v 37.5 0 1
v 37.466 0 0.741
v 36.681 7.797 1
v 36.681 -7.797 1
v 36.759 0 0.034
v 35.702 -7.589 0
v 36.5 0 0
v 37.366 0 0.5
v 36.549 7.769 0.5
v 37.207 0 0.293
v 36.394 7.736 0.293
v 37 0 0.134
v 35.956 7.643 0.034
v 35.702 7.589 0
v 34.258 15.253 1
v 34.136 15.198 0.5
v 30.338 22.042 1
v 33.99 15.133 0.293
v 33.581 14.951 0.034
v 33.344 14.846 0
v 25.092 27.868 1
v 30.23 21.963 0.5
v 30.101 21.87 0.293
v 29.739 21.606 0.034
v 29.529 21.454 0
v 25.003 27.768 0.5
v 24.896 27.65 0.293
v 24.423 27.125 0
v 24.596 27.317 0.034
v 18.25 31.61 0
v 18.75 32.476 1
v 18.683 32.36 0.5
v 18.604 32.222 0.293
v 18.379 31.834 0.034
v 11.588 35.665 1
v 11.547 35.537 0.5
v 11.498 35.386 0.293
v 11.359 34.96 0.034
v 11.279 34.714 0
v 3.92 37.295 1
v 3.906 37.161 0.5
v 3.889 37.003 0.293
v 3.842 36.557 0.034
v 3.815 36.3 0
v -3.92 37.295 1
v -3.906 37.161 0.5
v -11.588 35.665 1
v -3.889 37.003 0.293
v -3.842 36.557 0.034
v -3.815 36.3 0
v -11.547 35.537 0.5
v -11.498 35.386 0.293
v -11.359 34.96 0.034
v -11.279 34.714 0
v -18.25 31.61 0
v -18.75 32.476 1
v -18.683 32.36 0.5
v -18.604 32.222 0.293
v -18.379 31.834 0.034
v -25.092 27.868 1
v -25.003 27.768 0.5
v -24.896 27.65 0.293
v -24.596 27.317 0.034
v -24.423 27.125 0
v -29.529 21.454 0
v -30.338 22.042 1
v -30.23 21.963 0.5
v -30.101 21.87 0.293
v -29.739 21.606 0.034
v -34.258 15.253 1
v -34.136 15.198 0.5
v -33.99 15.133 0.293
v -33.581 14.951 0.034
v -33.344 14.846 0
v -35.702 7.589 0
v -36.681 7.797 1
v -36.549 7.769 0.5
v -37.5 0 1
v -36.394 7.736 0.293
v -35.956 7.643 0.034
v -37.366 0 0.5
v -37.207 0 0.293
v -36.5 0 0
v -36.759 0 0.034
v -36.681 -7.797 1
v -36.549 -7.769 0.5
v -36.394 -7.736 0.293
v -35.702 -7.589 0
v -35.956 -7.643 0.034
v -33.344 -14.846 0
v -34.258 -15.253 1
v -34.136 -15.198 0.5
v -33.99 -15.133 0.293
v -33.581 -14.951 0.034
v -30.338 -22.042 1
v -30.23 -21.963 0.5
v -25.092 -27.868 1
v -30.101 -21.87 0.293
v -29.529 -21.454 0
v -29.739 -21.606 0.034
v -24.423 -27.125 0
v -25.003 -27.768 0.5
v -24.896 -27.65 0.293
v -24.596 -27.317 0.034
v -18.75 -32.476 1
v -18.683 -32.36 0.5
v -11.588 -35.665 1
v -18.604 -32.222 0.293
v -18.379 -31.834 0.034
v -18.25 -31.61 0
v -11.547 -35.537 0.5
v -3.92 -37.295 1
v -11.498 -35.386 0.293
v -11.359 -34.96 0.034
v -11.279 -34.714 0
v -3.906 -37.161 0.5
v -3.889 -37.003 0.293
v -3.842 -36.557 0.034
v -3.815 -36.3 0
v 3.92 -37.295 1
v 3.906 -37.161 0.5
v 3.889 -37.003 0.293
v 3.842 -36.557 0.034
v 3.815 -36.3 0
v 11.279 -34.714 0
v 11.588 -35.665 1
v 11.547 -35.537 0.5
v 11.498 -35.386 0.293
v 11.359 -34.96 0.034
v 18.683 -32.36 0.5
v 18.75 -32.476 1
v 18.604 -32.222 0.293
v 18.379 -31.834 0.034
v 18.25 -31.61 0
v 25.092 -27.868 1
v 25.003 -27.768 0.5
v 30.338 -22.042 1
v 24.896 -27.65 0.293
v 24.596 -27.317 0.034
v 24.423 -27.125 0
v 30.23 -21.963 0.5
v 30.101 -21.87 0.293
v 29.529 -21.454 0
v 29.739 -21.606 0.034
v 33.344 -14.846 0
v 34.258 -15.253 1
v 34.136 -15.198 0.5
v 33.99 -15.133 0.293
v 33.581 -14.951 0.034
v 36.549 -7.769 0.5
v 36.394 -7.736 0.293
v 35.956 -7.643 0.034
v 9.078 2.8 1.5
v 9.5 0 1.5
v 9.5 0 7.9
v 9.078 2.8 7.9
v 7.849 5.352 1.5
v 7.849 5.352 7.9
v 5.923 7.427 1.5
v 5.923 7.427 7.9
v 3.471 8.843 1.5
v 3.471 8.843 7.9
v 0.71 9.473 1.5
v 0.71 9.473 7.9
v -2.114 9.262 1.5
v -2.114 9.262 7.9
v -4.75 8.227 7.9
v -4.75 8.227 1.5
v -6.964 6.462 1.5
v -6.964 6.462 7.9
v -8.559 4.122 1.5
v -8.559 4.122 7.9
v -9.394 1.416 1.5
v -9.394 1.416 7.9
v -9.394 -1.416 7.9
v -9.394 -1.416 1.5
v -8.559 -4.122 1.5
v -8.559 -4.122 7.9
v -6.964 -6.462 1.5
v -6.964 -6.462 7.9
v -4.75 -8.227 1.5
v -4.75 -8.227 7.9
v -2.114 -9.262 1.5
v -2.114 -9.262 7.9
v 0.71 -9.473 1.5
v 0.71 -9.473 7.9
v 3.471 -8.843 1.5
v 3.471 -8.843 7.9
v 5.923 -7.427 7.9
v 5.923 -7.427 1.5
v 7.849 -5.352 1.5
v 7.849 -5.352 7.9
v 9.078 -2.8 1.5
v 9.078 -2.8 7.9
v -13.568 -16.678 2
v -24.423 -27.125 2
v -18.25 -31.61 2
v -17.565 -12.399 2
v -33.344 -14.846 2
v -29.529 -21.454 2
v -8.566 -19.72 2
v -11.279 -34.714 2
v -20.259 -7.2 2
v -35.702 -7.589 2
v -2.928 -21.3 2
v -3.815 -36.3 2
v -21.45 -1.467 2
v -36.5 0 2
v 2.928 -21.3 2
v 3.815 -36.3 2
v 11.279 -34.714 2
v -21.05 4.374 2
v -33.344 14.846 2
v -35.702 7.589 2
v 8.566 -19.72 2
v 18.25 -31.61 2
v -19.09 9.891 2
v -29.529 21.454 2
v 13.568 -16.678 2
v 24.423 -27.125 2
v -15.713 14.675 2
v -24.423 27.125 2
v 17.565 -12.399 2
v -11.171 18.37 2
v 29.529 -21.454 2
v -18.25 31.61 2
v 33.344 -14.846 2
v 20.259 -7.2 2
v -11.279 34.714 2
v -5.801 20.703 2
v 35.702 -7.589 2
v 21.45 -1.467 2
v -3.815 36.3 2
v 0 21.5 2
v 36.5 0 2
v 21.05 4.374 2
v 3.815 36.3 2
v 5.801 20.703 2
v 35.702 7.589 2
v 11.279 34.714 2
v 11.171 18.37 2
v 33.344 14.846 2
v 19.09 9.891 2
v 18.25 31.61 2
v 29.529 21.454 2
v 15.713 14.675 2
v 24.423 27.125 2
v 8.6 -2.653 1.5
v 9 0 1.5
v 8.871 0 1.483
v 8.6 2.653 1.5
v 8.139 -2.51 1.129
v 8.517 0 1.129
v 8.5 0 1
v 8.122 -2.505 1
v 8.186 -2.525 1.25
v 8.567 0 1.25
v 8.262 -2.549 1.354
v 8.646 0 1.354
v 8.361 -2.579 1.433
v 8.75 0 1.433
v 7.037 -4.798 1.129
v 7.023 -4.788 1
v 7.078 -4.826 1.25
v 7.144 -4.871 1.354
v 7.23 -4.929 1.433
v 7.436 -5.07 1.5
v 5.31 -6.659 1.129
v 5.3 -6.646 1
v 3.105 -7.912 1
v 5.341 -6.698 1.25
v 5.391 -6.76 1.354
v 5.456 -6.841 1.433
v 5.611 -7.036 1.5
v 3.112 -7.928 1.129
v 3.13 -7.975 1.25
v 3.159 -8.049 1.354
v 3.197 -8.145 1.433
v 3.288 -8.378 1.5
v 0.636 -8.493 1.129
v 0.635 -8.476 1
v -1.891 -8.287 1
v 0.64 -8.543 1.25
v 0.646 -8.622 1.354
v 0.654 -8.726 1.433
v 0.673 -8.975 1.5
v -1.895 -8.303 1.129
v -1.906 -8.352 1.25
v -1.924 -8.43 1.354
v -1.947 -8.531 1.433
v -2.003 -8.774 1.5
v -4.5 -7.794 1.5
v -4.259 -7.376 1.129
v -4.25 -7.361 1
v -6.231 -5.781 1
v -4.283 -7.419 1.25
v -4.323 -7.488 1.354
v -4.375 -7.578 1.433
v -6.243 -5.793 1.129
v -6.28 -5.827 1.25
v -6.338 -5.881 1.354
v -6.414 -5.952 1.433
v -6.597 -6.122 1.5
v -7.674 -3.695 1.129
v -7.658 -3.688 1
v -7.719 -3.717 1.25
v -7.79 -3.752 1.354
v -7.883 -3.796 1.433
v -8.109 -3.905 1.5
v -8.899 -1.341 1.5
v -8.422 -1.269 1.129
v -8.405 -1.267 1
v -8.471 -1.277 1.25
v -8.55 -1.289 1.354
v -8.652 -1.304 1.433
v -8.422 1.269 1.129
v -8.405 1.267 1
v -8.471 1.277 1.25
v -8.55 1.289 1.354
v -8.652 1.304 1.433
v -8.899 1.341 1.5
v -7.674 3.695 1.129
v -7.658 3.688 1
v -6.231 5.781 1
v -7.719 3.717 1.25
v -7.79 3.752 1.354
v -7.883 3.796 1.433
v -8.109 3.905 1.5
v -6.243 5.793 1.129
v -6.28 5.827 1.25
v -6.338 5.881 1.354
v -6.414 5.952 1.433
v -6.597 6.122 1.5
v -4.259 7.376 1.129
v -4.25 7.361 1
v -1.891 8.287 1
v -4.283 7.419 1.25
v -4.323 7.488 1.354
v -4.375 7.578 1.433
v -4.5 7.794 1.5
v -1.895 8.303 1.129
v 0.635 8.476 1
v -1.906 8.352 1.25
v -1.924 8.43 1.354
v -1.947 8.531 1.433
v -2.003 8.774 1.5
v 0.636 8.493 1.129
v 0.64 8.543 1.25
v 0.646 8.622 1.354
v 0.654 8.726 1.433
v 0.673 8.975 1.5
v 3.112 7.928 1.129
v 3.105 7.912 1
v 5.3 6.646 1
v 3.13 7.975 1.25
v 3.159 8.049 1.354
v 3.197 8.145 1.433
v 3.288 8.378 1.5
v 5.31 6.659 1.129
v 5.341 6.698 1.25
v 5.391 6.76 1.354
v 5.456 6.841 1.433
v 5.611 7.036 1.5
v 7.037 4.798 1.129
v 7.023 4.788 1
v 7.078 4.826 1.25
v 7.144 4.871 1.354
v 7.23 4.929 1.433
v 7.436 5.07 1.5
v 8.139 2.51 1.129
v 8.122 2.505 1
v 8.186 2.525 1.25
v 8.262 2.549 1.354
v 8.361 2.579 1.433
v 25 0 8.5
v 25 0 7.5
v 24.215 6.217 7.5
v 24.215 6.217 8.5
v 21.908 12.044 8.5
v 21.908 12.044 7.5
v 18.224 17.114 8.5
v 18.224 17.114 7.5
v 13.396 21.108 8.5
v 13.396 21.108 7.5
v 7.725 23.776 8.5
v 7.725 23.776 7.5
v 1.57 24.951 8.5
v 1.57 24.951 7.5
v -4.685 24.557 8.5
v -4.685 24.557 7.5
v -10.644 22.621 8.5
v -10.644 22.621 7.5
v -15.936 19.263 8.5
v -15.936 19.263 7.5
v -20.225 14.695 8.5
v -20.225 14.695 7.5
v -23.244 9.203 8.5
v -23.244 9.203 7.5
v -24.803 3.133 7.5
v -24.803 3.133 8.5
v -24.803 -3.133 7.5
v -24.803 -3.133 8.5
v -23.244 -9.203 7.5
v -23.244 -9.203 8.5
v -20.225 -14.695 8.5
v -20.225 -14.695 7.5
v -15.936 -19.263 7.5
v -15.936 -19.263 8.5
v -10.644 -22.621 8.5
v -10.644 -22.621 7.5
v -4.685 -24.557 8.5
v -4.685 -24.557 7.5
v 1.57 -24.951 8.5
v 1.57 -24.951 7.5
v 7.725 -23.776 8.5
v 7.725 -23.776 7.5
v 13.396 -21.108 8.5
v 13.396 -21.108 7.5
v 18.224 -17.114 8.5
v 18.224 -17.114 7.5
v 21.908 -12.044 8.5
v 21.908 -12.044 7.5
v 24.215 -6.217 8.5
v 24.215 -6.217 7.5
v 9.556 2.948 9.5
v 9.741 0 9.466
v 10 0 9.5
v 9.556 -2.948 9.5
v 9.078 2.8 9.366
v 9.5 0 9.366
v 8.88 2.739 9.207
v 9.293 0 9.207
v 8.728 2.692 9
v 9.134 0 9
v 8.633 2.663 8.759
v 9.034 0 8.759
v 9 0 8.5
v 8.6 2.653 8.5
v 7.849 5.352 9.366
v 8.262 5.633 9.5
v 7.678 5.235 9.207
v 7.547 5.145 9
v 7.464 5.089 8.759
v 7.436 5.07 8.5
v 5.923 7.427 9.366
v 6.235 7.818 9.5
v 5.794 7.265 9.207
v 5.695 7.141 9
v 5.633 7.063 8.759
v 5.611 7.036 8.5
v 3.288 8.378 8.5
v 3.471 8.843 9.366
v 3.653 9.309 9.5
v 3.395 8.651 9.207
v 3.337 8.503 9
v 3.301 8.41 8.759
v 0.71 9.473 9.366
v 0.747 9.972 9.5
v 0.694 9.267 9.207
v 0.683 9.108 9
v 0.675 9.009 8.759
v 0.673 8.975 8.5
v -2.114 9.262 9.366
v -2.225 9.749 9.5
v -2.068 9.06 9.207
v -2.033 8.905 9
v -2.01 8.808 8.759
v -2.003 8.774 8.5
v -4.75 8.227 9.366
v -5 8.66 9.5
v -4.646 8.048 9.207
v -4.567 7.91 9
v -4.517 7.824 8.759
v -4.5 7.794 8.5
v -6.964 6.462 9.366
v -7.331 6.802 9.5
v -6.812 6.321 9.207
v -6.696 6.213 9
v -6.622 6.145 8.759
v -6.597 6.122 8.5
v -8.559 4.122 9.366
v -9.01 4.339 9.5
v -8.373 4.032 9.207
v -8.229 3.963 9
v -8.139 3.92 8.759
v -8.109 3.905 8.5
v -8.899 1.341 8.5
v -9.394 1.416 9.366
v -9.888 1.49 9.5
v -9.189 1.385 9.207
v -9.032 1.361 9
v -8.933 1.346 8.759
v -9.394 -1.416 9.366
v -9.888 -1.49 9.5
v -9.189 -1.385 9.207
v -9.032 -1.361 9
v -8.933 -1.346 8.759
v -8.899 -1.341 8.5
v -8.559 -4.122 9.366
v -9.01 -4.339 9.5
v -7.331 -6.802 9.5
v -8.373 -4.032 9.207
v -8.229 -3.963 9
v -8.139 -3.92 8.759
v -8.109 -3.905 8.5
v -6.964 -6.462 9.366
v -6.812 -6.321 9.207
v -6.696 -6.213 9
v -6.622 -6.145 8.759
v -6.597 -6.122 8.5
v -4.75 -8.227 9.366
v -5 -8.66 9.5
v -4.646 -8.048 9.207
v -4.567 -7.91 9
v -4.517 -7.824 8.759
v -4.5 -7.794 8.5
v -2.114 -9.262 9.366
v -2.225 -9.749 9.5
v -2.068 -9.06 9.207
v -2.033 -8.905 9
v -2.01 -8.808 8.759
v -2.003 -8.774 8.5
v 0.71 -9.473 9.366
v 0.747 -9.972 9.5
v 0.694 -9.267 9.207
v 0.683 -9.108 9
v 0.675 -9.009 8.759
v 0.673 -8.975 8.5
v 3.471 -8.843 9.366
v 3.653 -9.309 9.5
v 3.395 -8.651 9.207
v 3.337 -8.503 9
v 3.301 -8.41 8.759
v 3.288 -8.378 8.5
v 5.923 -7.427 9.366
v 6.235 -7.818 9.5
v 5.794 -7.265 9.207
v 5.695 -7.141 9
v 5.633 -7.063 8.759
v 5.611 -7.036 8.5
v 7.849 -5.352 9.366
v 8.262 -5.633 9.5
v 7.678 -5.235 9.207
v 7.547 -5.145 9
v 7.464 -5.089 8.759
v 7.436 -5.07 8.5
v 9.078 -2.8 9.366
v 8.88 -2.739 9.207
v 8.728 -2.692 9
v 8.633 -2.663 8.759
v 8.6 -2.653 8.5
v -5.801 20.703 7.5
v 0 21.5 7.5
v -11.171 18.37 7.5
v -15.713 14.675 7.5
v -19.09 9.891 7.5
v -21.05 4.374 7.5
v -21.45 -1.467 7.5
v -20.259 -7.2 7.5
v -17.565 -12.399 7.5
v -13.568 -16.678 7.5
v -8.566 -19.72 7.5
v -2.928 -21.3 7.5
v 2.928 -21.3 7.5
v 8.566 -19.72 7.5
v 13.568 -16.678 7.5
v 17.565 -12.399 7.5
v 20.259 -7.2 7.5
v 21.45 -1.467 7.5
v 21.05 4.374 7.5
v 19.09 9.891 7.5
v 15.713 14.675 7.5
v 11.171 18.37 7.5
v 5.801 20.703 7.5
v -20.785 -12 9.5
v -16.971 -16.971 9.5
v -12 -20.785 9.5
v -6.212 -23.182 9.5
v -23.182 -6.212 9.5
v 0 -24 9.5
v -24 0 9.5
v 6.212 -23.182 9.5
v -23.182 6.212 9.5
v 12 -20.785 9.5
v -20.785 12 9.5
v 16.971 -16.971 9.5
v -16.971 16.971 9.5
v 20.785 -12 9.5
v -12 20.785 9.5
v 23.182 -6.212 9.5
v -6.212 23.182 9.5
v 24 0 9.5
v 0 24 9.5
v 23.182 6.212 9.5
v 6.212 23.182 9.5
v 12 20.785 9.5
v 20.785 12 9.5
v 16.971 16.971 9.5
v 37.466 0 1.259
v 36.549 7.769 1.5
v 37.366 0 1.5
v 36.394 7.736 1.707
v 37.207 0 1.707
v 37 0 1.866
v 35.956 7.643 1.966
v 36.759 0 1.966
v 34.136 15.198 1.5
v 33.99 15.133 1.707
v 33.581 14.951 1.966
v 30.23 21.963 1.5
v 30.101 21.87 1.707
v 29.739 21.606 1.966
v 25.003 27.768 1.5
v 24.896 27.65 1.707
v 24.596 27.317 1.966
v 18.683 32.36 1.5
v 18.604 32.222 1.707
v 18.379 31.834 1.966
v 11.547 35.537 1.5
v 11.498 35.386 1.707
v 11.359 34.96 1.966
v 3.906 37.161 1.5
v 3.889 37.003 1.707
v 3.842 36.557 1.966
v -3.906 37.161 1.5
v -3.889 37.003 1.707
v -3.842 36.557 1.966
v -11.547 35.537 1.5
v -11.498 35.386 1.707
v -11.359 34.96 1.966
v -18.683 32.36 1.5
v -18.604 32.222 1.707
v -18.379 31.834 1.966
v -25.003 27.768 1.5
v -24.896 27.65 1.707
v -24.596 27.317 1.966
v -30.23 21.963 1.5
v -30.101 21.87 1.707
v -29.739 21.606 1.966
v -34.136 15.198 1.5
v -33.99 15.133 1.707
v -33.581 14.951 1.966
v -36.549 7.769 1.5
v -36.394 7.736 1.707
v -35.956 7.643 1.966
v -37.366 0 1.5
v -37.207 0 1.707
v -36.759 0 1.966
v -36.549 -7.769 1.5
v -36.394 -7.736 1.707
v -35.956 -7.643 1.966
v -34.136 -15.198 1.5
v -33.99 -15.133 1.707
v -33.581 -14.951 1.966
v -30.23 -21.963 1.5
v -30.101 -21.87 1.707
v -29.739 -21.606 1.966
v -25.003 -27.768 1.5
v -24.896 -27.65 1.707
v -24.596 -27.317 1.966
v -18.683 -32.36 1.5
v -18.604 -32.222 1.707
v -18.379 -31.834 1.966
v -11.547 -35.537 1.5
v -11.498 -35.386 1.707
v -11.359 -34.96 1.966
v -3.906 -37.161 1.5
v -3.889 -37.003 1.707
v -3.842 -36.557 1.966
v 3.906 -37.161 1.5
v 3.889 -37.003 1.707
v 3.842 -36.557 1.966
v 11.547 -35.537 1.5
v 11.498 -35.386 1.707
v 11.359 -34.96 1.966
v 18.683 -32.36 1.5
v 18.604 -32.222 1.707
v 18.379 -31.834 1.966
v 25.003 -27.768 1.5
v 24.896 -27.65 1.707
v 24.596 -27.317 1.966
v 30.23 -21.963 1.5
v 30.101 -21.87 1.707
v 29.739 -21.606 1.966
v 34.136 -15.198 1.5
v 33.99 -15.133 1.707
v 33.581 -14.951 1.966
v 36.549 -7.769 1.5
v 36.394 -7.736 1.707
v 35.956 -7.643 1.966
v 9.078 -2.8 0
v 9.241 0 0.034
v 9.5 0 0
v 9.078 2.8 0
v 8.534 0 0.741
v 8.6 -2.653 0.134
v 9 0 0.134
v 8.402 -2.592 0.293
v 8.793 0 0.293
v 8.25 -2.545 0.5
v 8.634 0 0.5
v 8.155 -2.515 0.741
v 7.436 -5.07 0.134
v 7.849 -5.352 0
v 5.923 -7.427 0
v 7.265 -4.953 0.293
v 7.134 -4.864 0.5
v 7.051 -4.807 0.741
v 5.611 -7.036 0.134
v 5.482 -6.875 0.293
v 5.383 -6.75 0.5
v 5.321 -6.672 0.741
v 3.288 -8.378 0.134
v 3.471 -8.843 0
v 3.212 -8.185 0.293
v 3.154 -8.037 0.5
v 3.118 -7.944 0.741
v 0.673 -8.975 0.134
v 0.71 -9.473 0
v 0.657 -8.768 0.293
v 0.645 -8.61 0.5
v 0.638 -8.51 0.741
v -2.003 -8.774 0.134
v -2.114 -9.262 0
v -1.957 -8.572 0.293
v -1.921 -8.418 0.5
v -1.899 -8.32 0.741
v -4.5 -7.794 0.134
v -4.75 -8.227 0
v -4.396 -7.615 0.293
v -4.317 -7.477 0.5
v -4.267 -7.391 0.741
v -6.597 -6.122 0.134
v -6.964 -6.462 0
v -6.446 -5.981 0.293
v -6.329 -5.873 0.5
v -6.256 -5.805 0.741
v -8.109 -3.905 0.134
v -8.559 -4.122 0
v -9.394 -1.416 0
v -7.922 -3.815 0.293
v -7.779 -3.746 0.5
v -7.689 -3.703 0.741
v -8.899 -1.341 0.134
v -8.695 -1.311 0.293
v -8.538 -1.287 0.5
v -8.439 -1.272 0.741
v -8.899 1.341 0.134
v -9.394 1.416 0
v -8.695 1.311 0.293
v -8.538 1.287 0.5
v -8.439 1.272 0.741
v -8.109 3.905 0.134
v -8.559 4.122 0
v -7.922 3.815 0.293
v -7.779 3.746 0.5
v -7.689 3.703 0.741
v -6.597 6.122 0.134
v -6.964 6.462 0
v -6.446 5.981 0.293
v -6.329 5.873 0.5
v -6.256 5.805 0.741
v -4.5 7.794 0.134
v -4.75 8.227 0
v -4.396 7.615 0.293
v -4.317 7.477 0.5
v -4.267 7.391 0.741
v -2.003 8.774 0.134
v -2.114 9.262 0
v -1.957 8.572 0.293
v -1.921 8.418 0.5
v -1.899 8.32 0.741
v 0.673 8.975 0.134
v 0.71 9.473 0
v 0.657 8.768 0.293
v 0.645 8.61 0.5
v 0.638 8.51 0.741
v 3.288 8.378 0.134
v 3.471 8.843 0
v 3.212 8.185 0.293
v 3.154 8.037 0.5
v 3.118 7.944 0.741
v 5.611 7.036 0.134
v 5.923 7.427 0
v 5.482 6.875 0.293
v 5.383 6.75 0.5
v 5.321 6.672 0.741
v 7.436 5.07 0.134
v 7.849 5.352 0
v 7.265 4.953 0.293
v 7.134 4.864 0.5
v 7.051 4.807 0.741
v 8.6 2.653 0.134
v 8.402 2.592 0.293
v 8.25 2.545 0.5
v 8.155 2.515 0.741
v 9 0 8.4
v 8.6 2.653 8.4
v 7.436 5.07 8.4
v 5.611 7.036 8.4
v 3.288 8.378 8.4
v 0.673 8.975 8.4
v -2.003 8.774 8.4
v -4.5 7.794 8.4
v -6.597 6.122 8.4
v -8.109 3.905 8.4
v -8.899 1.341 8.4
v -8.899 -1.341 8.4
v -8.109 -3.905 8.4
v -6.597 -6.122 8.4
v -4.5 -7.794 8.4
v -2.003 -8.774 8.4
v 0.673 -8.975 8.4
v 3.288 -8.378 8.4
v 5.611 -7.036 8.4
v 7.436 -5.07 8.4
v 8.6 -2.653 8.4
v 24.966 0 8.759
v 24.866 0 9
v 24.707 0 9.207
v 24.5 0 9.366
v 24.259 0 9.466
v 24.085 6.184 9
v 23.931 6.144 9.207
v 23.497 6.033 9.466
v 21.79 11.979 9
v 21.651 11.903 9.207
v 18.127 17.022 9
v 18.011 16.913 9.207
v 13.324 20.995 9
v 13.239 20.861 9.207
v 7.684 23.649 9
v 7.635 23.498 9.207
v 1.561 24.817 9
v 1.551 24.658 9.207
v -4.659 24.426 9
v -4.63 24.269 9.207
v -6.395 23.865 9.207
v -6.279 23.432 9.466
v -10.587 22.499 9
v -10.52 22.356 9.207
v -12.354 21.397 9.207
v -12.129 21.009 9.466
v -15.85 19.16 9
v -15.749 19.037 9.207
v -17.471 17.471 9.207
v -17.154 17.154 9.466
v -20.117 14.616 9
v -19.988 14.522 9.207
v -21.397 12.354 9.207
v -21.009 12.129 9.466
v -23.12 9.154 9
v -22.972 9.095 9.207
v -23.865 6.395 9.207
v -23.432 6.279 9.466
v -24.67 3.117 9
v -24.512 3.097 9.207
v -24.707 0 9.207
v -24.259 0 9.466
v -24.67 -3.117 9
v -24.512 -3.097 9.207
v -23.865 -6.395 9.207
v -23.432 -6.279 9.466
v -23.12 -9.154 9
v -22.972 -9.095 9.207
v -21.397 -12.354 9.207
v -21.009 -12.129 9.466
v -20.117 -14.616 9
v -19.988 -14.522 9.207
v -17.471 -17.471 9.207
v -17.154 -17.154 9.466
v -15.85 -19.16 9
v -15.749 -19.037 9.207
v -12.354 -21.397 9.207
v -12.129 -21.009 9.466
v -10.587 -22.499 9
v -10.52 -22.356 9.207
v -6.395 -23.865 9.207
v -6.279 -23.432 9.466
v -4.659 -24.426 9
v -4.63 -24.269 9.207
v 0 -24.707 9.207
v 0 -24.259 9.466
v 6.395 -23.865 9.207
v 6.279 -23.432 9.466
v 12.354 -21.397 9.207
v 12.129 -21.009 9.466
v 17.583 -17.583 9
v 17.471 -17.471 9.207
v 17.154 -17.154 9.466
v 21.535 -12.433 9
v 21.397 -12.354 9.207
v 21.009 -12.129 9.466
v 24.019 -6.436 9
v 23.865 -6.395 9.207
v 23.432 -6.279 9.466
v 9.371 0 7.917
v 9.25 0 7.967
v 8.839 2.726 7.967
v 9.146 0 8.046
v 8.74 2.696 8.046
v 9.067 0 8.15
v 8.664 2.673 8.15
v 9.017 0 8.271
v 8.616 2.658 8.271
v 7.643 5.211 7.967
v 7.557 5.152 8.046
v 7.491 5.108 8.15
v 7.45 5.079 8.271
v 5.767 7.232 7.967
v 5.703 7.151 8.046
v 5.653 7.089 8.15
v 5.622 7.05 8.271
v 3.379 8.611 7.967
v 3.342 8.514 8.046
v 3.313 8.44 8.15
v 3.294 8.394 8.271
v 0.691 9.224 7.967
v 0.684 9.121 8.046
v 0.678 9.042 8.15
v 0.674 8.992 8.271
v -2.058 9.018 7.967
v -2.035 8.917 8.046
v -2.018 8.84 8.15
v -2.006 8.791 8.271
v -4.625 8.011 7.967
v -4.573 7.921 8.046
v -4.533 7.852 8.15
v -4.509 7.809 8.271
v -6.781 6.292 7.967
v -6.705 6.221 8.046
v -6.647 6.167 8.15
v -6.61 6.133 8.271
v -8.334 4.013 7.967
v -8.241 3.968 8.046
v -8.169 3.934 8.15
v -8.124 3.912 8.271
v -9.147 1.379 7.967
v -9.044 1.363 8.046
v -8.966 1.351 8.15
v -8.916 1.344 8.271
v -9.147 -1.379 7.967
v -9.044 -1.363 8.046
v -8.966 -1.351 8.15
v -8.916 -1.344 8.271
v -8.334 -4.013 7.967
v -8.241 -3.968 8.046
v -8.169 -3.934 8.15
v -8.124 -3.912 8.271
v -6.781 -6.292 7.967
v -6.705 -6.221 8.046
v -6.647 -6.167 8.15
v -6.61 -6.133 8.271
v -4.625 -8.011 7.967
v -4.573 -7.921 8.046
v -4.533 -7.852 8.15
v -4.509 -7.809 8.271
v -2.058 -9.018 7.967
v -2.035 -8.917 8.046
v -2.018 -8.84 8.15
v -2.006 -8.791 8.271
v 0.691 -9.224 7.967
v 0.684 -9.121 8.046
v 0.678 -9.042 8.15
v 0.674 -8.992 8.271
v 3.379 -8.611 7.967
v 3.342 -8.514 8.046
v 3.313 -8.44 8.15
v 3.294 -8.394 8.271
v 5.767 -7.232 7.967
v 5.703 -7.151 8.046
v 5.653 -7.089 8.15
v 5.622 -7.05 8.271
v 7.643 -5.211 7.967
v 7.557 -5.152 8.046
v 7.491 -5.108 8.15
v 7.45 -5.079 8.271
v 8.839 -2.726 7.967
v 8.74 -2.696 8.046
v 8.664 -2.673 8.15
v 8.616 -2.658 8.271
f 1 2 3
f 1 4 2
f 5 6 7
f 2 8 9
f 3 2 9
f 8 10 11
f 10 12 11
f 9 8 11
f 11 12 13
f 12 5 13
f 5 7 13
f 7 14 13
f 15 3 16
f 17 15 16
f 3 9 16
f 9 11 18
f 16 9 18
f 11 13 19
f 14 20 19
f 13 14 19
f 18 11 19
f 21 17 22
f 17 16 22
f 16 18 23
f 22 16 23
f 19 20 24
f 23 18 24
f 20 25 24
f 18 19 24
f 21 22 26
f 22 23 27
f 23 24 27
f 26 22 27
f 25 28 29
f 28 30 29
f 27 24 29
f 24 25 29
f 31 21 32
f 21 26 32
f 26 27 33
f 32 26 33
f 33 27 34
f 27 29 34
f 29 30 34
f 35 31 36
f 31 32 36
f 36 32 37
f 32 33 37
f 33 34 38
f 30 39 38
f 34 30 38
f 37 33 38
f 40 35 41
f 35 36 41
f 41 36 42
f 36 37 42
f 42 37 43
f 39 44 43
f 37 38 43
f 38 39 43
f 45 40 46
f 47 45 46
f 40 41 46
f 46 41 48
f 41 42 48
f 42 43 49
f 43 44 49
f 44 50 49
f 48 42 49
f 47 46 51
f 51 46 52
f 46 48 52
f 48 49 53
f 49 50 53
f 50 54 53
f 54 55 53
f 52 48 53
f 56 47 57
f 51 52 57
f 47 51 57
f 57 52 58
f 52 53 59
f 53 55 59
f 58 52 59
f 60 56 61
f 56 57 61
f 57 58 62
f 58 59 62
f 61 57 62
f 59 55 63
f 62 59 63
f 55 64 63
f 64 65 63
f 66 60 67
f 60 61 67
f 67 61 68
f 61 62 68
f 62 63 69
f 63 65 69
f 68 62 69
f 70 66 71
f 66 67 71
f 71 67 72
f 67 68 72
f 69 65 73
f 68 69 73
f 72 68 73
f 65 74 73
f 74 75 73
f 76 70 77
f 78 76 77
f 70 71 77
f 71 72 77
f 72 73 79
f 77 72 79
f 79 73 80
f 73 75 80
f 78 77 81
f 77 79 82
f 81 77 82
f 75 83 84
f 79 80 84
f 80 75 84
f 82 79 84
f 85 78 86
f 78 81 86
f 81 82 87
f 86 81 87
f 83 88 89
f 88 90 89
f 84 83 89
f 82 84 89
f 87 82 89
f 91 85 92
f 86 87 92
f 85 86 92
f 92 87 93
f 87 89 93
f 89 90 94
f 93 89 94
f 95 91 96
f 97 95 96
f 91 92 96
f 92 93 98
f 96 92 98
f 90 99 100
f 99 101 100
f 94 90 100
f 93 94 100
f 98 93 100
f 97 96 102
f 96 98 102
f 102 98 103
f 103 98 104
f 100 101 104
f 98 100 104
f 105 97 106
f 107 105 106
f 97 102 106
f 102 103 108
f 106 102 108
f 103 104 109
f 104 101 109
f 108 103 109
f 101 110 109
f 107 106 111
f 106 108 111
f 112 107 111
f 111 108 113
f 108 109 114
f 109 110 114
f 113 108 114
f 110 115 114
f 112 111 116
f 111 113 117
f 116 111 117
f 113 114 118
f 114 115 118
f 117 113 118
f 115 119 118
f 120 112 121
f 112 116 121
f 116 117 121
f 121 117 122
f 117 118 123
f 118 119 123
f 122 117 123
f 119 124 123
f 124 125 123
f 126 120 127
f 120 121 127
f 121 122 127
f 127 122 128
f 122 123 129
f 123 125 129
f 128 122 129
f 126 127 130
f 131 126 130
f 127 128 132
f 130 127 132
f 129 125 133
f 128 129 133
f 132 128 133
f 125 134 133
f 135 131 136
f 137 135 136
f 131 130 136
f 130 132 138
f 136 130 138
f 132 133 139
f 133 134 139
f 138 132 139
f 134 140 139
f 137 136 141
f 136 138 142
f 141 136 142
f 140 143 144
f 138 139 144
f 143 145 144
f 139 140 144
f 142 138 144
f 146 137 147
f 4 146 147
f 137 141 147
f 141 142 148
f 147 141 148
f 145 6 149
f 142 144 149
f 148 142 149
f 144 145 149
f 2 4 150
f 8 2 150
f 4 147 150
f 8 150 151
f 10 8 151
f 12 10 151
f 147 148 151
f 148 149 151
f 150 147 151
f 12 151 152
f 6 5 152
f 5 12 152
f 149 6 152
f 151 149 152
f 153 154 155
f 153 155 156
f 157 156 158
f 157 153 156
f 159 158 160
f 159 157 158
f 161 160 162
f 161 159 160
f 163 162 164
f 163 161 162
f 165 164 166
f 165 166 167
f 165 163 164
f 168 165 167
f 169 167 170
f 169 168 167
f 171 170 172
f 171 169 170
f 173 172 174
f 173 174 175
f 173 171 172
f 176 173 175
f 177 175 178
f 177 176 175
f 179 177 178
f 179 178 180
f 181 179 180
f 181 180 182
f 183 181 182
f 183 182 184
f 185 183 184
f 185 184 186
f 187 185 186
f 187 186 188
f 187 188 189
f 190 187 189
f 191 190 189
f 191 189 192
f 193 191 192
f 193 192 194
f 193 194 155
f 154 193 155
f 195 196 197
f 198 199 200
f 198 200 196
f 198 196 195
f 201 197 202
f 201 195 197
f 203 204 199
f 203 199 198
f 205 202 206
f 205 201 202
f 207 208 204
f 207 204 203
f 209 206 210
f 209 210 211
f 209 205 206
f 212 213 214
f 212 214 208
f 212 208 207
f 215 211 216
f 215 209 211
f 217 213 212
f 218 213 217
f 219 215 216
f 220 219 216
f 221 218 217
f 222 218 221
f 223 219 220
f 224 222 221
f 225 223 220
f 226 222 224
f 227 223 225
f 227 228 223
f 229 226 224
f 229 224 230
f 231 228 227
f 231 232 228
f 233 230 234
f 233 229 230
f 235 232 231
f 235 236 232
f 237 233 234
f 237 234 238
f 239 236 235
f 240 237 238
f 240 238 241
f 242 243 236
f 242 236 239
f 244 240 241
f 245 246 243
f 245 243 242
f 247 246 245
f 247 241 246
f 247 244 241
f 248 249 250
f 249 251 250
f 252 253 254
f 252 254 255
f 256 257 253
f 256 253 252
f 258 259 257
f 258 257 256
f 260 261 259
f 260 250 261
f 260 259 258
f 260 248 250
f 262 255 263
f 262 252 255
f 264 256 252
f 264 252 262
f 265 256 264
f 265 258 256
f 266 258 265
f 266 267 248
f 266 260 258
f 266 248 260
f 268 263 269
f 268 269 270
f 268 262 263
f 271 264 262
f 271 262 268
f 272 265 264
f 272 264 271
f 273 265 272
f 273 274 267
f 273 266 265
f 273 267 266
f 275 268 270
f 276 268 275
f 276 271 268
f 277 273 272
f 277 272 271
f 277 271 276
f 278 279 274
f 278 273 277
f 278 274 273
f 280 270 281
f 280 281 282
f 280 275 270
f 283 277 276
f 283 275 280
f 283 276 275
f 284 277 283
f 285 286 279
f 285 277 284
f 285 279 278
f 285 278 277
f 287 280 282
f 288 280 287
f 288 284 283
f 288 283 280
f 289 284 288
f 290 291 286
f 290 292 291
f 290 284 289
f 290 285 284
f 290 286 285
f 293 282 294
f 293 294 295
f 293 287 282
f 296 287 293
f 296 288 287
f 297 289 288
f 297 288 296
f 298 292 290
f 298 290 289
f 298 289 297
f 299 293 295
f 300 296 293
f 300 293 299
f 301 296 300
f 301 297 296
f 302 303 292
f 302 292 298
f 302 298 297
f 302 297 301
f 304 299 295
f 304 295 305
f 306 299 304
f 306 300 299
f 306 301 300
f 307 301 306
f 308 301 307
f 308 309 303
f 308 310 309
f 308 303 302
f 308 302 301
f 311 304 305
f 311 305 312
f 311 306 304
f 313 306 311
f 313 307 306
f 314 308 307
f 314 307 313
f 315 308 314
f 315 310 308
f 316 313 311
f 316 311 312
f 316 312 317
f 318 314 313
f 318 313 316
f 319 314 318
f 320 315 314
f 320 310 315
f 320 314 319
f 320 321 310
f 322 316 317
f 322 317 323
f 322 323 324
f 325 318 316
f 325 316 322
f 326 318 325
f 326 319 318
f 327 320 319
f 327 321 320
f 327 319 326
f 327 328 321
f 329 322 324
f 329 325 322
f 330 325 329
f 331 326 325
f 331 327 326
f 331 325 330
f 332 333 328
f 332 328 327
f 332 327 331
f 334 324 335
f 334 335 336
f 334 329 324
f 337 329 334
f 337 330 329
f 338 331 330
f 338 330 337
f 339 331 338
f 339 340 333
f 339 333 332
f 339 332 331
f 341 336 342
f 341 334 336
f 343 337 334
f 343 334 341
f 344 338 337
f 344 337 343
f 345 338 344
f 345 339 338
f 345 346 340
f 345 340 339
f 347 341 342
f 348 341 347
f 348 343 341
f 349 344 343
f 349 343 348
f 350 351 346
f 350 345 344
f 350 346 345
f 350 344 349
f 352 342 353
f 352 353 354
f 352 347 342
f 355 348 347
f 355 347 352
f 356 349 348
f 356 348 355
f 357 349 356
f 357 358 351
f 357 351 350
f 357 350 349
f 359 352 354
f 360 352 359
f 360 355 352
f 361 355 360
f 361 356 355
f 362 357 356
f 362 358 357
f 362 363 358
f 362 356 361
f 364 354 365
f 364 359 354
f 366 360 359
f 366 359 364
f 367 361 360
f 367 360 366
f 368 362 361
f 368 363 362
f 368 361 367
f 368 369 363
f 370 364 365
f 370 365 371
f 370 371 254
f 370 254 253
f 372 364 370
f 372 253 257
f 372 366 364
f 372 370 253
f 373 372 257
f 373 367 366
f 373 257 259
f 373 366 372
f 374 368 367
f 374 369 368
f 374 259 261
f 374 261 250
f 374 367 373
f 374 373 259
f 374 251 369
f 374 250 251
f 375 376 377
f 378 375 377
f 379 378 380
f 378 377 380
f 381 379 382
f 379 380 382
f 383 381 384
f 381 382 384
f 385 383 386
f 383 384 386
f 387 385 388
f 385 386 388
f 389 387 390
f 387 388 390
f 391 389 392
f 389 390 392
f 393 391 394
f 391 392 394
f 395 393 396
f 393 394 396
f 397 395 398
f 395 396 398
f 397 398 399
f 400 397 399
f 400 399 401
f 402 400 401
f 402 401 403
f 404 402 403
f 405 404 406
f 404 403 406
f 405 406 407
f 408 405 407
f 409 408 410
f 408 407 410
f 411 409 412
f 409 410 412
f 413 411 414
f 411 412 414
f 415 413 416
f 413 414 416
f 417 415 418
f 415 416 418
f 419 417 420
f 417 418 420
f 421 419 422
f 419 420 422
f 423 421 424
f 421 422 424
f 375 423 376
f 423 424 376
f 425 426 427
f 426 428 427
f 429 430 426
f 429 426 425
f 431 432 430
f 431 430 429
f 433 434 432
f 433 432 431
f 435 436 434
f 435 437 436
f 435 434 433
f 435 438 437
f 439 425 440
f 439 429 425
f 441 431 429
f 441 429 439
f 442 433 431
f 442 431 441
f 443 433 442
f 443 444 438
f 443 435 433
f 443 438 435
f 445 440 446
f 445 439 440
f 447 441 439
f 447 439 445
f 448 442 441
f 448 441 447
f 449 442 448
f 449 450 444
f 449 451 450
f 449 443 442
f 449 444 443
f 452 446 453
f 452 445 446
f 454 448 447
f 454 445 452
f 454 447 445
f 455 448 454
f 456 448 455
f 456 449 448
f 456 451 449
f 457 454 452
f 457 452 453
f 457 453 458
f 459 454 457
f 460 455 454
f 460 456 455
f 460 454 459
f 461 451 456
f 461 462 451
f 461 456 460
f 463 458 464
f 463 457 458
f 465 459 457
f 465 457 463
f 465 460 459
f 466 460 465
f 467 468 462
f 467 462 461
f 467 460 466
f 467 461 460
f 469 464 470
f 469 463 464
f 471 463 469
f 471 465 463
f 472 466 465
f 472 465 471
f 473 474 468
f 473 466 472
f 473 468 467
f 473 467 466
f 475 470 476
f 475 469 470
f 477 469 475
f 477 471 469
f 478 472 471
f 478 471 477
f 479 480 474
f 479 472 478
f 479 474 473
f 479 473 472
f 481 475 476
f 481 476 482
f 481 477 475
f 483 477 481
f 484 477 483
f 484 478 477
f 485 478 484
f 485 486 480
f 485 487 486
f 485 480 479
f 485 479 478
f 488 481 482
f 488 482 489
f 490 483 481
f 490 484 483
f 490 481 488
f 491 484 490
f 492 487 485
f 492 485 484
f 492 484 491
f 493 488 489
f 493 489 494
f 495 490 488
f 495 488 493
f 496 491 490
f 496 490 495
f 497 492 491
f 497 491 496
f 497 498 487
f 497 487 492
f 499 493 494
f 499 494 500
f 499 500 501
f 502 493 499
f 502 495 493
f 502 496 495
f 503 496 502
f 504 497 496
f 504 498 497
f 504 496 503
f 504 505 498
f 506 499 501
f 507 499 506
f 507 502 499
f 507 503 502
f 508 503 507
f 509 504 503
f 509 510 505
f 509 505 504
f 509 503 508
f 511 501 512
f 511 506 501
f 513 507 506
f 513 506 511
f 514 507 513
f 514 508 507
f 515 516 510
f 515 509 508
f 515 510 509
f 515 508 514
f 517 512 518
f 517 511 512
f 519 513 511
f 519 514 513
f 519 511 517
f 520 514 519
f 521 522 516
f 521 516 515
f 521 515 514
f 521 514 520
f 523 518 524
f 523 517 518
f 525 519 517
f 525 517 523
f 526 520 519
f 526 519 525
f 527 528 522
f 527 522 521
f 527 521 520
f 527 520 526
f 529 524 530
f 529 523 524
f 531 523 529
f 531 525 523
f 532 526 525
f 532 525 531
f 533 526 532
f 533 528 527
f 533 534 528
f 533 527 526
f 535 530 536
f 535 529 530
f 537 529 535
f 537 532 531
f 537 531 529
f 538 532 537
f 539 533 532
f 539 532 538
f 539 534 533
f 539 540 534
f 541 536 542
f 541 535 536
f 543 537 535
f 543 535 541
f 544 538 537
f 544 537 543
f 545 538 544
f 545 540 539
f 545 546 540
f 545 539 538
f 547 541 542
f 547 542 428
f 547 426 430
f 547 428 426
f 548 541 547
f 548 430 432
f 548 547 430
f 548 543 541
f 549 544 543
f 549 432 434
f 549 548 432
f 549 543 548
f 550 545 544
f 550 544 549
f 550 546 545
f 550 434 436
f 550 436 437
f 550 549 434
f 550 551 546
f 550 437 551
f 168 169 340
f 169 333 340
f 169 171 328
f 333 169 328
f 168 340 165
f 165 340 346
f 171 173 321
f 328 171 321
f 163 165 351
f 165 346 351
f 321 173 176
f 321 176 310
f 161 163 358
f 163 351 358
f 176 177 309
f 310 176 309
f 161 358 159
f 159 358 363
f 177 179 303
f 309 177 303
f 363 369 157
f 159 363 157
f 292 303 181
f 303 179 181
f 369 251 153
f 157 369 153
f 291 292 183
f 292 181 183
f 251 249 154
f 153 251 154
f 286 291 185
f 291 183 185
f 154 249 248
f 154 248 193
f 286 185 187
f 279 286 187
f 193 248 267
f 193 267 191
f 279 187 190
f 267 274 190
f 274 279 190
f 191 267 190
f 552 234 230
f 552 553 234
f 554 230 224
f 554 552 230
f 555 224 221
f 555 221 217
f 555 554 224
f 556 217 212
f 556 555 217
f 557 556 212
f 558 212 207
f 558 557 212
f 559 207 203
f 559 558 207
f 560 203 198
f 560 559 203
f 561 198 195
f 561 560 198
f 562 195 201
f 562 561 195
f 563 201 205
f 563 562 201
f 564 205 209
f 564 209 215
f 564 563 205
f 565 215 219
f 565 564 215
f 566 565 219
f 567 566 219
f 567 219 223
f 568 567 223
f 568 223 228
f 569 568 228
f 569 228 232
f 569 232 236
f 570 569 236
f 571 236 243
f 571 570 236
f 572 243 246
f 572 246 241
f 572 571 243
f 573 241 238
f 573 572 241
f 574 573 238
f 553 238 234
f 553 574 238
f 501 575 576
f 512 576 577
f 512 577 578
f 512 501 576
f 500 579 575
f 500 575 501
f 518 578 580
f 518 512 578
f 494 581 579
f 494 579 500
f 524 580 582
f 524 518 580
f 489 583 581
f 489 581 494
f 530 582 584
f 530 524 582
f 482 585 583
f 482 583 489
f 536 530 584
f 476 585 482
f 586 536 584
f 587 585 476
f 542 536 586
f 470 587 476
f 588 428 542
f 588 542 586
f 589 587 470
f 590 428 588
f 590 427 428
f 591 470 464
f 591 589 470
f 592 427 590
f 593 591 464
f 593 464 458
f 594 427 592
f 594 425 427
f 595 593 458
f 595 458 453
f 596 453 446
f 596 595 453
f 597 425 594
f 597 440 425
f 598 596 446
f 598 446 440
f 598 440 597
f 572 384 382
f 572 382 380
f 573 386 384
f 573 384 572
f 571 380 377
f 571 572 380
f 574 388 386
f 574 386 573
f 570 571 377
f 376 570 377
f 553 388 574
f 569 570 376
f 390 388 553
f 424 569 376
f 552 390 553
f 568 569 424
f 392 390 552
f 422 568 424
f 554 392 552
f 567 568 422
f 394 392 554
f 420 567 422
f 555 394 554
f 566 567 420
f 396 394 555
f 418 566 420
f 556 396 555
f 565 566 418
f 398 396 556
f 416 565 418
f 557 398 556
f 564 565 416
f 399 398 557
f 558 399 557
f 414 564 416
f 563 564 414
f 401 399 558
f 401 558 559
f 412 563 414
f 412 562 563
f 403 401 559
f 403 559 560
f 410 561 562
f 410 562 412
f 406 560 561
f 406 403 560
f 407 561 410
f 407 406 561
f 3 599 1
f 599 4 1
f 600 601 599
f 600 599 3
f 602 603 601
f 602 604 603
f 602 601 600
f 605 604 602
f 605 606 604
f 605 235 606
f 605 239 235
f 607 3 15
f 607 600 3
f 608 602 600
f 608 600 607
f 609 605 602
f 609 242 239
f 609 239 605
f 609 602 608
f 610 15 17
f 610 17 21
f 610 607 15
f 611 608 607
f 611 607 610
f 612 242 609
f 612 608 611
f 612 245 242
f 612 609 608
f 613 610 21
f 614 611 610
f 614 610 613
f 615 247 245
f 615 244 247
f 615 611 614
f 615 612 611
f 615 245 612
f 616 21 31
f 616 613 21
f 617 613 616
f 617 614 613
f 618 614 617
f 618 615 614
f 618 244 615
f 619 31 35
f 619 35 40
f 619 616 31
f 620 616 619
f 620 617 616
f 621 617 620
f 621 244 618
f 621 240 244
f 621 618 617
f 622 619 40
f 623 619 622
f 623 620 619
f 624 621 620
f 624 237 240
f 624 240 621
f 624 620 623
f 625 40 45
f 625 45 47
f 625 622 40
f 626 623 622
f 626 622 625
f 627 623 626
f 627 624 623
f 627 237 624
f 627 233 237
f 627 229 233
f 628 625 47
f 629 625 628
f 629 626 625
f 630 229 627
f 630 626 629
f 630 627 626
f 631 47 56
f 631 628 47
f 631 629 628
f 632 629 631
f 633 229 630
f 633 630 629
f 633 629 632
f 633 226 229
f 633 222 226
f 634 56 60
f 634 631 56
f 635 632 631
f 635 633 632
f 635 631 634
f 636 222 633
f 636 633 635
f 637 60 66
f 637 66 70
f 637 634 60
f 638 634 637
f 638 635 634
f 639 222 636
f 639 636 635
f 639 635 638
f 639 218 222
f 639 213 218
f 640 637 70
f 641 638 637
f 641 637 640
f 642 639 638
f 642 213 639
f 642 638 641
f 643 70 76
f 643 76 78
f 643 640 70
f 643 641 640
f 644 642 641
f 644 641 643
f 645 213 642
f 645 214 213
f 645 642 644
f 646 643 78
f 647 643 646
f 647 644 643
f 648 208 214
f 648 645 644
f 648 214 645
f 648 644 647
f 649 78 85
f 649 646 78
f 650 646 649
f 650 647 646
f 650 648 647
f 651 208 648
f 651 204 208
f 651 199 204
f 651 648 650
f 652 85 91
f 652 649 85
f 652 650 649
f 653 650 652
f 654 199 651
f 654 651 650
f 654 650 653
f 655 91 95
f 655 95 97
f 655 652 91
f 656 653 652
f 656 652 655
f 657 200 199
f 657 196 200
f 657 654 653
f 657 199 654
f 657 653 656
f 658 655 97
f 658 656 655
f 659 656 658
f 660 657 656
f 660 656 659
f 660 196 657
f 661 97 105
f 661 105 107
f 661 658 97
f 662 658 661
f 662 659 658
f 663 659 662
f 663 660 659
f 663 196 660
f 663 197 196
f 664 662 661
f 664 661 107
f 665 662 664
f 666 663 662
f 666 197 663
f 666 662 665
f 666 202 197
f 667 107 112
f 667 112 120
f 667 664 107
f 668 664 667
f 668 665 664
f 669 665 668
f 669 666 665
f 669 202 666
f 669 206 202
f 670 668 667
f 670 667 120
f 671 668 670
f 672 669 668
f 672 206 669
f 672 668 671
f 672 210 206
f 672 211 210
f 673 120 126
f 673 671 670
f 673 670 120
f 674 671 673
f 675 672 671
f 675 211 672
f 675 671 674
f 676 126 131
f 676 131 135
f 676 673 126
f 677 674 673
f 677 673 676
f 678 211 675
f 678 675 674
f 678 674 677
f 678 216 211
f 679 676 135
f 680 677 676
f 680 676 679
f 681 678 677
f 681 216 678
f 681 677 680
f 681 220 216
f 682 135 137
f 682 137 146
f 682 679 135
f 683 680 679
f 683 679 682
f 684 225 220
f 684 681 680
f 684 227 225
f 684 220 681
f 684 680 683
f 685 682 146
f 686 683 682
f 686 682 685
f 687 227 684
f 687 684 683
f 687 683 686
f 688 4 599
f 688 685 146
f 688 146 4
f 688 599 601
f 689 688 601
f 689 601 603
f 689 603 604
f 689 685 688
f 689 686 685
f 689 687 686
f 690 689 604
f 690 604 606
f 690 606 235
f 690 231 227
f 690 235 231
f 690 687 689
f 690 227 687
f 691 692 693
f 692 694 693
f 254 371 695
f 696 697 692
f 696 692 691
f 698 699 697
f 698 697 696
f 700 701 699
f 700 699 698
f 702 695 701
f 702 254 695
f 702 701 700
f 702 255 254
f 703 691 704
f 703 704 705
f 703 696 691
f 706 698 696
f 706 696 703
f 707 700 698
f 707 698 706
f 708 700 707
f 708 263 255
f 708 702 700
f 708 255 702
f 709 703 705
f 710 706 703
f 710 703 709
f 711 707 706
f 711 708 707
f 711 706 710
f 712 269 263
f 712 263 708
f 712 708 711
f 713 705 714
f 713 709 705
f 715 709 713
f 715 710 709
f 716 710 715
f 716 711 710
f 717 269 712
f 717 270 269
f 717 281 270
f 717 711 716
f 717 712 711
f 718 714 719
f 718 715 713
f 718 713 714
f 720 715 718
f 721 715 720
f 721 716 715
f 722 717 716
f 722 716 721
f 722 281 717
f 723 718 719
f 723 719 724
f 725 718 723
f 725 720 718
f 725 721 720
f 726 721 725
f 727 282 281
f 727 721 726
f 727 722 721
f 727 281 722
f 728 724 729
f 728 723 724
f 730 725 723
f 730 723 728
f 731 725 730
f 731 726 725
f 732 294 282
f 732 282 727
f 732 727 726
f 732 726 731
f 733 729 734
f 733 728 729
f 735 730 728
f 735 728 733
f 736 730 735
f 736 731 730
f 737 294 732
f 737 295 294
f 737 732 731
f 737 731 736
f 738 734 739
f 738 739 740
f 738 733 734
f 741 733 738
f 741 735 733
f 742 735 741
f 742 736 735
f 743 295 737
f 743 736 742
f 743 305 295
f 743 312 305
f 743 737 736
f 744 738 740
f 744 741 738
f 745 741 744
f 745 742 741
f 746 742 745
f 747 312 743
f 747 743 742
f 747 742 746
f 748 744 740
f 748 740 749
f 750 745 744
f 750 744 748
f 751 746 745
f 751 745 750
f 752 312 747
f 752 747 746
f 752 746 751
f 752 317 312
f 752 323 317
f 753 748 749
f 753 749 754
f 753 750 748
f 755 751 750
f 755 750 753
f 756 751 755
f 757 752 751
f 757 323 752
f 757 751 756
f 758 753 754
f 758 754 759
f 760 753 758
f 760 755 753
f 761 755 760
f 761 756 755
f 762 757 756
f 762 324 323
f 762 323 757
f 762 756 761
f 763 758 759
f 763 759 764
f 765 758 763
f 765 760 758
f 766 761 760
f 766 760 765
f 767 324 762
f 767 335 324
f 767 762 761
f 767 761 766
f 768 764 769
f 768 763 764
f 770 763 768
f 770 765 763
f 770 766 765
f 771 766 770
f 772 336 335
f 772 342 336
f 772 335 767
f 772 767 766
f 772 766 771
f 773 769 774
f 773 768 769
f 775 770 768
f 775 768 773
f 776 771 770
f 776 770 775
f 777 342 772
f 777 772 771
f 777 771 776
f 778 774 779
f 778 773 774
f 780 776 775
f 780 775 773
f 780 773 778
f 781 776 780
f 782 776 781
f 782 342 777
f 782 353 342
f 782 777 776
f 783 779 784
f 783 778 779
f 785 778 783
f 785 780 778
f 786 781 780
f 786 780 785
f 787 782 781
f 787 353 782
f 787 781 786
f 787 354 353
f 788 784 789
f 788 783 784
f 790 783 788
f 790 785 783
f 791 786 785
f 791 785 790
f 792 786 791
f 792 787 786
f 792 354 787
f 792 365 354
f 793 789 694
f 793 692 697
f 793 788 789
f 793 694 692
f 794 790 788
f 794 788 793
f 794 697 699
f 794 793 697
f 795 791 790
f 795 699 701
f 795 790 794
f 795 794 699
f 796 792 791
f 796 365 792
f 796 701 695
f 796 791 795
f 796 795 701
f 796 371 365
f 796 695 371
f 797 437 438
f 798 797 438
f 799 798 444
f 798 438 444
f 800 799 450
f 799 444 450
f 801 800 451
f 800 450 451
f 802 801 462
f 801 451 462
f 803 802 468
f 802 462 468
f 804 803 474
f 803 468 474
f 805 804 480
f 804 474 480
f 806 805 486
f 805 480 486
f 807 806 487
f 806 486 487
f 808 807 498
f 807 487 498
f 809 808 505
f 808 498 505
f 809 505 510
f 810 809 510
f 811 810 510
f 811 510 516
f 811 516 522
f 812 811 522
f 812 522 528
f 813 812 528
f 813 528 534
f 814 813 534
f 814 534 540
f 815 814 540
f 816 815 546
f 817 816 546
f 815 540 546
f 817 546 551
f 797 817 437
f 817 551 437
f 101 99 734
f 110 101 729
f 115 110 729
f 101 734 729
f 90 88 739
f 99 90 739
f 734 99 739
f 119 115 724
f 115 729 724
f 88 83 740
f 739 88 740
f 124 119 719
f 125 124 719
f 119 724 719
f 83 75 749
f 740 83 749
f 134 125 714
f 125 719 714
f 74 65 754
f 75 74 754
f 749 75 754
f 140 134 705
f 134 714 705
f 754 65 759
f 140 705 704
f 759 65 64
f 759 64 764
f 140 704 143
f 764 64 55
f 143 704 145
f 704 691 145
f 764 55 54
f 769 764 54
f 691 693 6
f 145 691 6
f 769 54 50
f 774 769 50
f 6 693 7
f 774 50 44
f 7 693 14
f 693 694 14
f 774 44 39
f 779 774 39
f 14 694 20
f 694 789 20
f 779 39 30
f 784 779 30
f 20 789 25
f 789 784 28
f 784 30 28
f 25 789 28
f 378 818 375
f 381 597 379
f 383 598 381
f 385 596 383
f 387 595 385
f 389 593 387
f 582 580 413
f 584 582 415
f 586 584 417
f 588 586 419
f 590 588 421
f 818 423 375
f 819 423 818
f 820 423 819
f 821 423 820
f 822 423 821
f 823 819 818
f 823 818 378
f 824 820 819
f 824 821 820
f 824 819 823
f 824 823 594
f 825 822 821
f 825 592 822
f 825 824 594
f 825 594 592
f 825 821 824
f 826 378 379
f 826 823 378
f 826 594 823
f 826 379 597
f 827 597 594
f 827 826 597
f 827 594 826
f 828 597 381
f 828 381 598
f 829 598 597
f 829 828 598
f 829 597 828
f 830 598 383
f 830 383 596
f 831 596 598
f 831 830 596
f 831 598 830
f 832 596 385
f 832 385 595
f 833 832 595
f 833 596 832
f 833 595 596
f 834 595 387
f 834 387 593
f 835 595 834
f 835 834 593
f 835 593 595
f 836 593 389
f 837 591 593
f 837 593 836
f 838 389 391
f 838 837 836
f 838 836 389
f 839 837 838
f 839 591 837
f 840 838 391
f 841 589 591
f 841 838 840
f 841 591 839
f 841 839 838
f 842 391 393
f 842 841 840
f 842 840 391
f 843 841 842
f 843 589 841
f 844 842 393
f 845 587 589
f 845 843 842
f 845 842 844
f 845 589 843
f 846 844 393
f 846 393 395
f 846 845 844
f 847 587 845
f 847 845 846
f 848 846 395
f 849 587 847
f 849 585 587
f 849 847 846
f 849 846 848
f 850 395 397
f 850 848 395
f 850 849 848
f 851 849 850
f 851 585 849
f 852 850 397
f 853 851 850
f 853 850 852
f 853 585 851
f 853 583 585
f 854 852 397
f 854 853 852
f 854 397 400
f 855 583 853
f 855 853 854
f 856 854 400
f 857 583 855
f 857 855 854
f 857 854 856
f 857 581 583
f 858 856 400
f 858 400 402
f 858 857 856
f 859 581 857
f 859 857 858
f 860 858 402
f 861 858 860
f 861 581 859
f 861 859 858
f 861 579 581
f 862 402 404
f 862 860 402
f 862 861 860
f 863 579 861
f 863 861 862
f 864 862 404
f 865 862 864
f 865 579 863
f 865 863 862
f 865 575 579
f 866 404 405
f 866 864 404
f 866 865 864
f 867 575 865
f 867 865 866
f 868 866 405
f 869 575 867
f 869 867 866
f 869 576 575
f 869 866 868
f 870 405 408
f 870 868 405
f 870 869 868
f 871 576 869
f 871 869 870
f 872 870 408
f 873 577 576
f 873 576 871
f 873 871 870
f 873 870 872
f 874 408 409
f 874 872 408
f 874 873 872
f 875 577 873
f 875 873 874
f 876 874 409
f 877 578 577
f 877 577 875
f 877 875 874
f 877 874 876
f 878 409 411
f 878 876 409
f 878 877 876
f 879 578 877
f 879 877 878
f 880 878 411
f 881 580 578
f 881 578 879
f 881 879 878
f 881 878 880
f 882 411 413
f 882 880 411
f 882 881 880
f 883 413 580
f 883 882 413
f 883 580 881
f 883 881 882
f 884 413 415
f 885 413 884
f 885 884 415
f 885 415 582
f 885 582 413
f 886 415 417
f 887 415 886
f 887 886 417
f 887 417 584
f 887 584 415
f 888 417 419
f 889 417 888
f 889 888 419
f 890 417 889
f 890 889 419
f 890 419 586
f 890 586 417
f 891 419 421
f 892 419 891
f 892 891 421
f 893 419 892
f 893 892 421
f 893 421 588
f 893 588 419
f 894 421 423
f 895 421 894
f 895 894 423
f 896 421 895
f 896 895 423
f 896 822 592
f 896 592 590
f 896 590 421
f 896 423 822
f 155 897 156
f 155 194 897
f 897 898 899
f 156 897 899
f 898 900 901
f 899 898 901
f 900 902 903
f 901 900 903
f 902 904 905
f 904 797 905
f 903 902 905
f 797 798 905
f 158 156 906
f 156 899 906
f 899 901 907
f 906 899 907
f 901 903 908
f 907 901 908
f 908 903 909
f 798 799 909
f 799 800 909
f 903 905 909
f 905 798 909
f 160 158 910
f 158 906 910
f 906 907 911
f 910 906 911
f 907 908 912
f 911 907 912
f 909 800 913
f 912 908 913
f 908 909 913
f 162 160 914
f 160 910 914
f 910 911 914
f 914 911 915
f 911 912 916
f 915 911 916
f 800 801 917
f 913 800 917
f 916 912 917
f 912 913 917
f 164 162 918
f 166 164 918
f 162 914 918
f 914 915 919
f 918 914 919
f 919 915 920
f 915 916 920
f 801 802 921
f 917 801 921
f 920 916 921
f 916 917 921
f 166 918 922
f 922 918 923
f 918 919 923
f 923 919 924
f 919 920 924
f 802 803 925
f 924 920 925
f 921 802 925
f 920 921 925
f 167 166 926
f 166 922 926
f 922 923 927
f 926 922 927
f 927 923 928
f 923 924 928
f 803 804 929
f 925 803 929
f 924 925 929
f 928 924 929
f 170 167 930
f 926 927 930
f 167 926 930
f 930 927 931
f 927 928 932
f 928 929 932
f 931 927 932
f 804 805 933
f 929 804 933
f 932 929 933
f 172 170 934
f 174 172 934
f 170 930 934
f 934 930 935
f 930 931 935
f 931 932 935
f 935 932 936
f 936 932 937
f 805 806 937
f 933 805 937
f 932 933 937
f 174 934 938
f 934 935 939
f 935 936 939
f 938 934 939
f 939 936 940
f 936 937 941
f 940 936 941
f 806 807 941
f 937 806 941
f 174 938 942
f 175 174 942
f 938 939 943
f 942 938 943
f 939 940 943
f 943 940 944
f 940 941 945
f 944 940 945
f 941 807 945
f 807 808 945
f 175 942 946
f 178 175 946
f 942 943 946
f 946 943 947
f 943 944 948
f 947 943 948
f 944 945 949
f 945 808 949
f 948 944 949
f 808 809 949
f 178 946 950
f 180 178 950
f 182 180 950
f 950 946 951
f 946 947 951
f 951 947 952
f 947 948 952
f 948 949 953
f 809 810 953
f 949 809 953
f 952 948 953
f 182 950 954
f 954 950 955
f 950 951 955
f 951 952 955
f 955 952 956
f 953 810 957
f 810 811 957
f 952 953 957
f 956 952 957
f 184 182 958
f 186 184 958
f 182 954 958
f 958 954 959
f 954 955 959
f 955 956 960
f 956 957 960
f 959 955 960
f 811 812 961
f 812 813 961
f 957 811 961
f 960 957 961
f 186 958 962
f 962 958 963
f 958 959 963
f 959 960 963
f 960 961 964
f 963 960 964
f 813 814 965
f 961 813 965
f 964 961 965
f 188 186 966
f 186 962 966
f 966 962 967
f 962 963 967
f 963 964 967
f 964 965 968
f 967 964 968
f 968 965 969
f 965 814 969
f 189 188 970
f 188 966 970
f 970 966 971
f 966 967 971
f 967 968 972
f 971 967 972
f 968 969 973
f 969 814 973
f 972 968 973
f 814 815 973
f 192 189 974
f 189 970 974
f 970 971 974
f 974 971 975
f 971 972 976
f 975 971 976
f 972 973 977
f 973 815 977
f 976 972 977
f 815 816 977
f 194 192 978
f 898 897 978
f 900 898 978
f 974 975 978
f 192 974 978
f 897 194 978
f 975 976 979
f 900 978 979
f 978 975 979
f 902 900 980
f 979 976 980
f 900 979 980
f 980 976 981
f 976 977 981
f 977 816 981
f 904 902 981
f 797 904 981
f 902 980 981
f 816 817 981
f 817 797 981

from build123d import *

# Parameters (mm, degrees)
F0_R     = 25
F0_R_2   = 9.5
F1_DEPTH = 9.5
F2_W     = 3.5
F2_H     = 5.5
F4_R     = 9.5
F4_R_2   = 8.5
F5_DEPTH = 1.5
F6_R     = 9.5
F6_R_2   = 9
F7_DEPTH = 1.6
F0_R_3   = 37.5
F8_DEPTH = 2
F9_R     = 0.99999
F10_R    = 0.49999


# Not quite as in the source:
# - a fillet or chamfer is up to 0.001 mm smaller than in the source, because OpenCascade refuses the exact size


with BuildPart() as f1:
    # F0 (on Top) → F1 (new body)
    with BuildSketch(Plane.XY):
        Circle(F0_R)
        Circle(F0_R_2, mode=Mode.SUBTRACT)
    extrude(amount=F1_DEPTH)

    # F2 (on Right) → F3 (revolve, cut)
    with BuildSketch(Plane.YZ):
        with Locations((23.25, 4.75)):
            Rectangle(F2_W, F2_H)
    revolve(axis=Axis((0, 0, 13.2580241188), (0, 0, 1)), mode=Mode.SUBTRACT)

    # F4 (on face) → F5 (join)
    with BuildSketch(Plane(origin=(0, 0, 0), x_dir=(1, 0, 0), z_dir=(0, 0, -1))):
        Circle(F4_R)
        Circle(F4_R_2, mode=Mode.SUBTRACT)
    extrude(amount=-F5_DEPTH)

    # F6 (on face) → F7 (join)
    with BuildSketch(Plane.XY.offset(9.5)):
        Circle(F6_R)
        Circle(F6_R_2, mode=Mode.SUBTRACT)
    extrude(amount=-F7_DEPTH)

    # F0 (on Top) → F8 (join)
    with BuildSketch(Plane.XY):
        Circle(F0_R_3)
        Circle(F0_R, mode=Mode.SUBTRACT)
    extrude(amount=F8_DEPTH)

    # F9 (radius 1 in the source; OpenCascade refuses exactly that, so slightly less here)
    f9_edges = [f1.edges().sort_by_distance(p)[0] for p in [
        (37.5, 0, 1),
        (-37.5, 0, 0),
        (-37.5, 0, 2),
        (-25, 0, 9.5),
        (-9, 0, 9.5),
        (-8.5, 0, 0),
    ]]
    fillet(f9_edges, radius=F9_R)

    # F10 (radius 0.5 in the source; OpenCascade refuses exactly that, so slightly less here)
    f10_edges = [f1.edges().sort_by_distance(p)[0] for p in [
        (-8.5, 0, 1.5),
        (-9, 0, 7.9),
    ]]
    fillet(f10_edges, radius=F10_R)


solid = f1.part
